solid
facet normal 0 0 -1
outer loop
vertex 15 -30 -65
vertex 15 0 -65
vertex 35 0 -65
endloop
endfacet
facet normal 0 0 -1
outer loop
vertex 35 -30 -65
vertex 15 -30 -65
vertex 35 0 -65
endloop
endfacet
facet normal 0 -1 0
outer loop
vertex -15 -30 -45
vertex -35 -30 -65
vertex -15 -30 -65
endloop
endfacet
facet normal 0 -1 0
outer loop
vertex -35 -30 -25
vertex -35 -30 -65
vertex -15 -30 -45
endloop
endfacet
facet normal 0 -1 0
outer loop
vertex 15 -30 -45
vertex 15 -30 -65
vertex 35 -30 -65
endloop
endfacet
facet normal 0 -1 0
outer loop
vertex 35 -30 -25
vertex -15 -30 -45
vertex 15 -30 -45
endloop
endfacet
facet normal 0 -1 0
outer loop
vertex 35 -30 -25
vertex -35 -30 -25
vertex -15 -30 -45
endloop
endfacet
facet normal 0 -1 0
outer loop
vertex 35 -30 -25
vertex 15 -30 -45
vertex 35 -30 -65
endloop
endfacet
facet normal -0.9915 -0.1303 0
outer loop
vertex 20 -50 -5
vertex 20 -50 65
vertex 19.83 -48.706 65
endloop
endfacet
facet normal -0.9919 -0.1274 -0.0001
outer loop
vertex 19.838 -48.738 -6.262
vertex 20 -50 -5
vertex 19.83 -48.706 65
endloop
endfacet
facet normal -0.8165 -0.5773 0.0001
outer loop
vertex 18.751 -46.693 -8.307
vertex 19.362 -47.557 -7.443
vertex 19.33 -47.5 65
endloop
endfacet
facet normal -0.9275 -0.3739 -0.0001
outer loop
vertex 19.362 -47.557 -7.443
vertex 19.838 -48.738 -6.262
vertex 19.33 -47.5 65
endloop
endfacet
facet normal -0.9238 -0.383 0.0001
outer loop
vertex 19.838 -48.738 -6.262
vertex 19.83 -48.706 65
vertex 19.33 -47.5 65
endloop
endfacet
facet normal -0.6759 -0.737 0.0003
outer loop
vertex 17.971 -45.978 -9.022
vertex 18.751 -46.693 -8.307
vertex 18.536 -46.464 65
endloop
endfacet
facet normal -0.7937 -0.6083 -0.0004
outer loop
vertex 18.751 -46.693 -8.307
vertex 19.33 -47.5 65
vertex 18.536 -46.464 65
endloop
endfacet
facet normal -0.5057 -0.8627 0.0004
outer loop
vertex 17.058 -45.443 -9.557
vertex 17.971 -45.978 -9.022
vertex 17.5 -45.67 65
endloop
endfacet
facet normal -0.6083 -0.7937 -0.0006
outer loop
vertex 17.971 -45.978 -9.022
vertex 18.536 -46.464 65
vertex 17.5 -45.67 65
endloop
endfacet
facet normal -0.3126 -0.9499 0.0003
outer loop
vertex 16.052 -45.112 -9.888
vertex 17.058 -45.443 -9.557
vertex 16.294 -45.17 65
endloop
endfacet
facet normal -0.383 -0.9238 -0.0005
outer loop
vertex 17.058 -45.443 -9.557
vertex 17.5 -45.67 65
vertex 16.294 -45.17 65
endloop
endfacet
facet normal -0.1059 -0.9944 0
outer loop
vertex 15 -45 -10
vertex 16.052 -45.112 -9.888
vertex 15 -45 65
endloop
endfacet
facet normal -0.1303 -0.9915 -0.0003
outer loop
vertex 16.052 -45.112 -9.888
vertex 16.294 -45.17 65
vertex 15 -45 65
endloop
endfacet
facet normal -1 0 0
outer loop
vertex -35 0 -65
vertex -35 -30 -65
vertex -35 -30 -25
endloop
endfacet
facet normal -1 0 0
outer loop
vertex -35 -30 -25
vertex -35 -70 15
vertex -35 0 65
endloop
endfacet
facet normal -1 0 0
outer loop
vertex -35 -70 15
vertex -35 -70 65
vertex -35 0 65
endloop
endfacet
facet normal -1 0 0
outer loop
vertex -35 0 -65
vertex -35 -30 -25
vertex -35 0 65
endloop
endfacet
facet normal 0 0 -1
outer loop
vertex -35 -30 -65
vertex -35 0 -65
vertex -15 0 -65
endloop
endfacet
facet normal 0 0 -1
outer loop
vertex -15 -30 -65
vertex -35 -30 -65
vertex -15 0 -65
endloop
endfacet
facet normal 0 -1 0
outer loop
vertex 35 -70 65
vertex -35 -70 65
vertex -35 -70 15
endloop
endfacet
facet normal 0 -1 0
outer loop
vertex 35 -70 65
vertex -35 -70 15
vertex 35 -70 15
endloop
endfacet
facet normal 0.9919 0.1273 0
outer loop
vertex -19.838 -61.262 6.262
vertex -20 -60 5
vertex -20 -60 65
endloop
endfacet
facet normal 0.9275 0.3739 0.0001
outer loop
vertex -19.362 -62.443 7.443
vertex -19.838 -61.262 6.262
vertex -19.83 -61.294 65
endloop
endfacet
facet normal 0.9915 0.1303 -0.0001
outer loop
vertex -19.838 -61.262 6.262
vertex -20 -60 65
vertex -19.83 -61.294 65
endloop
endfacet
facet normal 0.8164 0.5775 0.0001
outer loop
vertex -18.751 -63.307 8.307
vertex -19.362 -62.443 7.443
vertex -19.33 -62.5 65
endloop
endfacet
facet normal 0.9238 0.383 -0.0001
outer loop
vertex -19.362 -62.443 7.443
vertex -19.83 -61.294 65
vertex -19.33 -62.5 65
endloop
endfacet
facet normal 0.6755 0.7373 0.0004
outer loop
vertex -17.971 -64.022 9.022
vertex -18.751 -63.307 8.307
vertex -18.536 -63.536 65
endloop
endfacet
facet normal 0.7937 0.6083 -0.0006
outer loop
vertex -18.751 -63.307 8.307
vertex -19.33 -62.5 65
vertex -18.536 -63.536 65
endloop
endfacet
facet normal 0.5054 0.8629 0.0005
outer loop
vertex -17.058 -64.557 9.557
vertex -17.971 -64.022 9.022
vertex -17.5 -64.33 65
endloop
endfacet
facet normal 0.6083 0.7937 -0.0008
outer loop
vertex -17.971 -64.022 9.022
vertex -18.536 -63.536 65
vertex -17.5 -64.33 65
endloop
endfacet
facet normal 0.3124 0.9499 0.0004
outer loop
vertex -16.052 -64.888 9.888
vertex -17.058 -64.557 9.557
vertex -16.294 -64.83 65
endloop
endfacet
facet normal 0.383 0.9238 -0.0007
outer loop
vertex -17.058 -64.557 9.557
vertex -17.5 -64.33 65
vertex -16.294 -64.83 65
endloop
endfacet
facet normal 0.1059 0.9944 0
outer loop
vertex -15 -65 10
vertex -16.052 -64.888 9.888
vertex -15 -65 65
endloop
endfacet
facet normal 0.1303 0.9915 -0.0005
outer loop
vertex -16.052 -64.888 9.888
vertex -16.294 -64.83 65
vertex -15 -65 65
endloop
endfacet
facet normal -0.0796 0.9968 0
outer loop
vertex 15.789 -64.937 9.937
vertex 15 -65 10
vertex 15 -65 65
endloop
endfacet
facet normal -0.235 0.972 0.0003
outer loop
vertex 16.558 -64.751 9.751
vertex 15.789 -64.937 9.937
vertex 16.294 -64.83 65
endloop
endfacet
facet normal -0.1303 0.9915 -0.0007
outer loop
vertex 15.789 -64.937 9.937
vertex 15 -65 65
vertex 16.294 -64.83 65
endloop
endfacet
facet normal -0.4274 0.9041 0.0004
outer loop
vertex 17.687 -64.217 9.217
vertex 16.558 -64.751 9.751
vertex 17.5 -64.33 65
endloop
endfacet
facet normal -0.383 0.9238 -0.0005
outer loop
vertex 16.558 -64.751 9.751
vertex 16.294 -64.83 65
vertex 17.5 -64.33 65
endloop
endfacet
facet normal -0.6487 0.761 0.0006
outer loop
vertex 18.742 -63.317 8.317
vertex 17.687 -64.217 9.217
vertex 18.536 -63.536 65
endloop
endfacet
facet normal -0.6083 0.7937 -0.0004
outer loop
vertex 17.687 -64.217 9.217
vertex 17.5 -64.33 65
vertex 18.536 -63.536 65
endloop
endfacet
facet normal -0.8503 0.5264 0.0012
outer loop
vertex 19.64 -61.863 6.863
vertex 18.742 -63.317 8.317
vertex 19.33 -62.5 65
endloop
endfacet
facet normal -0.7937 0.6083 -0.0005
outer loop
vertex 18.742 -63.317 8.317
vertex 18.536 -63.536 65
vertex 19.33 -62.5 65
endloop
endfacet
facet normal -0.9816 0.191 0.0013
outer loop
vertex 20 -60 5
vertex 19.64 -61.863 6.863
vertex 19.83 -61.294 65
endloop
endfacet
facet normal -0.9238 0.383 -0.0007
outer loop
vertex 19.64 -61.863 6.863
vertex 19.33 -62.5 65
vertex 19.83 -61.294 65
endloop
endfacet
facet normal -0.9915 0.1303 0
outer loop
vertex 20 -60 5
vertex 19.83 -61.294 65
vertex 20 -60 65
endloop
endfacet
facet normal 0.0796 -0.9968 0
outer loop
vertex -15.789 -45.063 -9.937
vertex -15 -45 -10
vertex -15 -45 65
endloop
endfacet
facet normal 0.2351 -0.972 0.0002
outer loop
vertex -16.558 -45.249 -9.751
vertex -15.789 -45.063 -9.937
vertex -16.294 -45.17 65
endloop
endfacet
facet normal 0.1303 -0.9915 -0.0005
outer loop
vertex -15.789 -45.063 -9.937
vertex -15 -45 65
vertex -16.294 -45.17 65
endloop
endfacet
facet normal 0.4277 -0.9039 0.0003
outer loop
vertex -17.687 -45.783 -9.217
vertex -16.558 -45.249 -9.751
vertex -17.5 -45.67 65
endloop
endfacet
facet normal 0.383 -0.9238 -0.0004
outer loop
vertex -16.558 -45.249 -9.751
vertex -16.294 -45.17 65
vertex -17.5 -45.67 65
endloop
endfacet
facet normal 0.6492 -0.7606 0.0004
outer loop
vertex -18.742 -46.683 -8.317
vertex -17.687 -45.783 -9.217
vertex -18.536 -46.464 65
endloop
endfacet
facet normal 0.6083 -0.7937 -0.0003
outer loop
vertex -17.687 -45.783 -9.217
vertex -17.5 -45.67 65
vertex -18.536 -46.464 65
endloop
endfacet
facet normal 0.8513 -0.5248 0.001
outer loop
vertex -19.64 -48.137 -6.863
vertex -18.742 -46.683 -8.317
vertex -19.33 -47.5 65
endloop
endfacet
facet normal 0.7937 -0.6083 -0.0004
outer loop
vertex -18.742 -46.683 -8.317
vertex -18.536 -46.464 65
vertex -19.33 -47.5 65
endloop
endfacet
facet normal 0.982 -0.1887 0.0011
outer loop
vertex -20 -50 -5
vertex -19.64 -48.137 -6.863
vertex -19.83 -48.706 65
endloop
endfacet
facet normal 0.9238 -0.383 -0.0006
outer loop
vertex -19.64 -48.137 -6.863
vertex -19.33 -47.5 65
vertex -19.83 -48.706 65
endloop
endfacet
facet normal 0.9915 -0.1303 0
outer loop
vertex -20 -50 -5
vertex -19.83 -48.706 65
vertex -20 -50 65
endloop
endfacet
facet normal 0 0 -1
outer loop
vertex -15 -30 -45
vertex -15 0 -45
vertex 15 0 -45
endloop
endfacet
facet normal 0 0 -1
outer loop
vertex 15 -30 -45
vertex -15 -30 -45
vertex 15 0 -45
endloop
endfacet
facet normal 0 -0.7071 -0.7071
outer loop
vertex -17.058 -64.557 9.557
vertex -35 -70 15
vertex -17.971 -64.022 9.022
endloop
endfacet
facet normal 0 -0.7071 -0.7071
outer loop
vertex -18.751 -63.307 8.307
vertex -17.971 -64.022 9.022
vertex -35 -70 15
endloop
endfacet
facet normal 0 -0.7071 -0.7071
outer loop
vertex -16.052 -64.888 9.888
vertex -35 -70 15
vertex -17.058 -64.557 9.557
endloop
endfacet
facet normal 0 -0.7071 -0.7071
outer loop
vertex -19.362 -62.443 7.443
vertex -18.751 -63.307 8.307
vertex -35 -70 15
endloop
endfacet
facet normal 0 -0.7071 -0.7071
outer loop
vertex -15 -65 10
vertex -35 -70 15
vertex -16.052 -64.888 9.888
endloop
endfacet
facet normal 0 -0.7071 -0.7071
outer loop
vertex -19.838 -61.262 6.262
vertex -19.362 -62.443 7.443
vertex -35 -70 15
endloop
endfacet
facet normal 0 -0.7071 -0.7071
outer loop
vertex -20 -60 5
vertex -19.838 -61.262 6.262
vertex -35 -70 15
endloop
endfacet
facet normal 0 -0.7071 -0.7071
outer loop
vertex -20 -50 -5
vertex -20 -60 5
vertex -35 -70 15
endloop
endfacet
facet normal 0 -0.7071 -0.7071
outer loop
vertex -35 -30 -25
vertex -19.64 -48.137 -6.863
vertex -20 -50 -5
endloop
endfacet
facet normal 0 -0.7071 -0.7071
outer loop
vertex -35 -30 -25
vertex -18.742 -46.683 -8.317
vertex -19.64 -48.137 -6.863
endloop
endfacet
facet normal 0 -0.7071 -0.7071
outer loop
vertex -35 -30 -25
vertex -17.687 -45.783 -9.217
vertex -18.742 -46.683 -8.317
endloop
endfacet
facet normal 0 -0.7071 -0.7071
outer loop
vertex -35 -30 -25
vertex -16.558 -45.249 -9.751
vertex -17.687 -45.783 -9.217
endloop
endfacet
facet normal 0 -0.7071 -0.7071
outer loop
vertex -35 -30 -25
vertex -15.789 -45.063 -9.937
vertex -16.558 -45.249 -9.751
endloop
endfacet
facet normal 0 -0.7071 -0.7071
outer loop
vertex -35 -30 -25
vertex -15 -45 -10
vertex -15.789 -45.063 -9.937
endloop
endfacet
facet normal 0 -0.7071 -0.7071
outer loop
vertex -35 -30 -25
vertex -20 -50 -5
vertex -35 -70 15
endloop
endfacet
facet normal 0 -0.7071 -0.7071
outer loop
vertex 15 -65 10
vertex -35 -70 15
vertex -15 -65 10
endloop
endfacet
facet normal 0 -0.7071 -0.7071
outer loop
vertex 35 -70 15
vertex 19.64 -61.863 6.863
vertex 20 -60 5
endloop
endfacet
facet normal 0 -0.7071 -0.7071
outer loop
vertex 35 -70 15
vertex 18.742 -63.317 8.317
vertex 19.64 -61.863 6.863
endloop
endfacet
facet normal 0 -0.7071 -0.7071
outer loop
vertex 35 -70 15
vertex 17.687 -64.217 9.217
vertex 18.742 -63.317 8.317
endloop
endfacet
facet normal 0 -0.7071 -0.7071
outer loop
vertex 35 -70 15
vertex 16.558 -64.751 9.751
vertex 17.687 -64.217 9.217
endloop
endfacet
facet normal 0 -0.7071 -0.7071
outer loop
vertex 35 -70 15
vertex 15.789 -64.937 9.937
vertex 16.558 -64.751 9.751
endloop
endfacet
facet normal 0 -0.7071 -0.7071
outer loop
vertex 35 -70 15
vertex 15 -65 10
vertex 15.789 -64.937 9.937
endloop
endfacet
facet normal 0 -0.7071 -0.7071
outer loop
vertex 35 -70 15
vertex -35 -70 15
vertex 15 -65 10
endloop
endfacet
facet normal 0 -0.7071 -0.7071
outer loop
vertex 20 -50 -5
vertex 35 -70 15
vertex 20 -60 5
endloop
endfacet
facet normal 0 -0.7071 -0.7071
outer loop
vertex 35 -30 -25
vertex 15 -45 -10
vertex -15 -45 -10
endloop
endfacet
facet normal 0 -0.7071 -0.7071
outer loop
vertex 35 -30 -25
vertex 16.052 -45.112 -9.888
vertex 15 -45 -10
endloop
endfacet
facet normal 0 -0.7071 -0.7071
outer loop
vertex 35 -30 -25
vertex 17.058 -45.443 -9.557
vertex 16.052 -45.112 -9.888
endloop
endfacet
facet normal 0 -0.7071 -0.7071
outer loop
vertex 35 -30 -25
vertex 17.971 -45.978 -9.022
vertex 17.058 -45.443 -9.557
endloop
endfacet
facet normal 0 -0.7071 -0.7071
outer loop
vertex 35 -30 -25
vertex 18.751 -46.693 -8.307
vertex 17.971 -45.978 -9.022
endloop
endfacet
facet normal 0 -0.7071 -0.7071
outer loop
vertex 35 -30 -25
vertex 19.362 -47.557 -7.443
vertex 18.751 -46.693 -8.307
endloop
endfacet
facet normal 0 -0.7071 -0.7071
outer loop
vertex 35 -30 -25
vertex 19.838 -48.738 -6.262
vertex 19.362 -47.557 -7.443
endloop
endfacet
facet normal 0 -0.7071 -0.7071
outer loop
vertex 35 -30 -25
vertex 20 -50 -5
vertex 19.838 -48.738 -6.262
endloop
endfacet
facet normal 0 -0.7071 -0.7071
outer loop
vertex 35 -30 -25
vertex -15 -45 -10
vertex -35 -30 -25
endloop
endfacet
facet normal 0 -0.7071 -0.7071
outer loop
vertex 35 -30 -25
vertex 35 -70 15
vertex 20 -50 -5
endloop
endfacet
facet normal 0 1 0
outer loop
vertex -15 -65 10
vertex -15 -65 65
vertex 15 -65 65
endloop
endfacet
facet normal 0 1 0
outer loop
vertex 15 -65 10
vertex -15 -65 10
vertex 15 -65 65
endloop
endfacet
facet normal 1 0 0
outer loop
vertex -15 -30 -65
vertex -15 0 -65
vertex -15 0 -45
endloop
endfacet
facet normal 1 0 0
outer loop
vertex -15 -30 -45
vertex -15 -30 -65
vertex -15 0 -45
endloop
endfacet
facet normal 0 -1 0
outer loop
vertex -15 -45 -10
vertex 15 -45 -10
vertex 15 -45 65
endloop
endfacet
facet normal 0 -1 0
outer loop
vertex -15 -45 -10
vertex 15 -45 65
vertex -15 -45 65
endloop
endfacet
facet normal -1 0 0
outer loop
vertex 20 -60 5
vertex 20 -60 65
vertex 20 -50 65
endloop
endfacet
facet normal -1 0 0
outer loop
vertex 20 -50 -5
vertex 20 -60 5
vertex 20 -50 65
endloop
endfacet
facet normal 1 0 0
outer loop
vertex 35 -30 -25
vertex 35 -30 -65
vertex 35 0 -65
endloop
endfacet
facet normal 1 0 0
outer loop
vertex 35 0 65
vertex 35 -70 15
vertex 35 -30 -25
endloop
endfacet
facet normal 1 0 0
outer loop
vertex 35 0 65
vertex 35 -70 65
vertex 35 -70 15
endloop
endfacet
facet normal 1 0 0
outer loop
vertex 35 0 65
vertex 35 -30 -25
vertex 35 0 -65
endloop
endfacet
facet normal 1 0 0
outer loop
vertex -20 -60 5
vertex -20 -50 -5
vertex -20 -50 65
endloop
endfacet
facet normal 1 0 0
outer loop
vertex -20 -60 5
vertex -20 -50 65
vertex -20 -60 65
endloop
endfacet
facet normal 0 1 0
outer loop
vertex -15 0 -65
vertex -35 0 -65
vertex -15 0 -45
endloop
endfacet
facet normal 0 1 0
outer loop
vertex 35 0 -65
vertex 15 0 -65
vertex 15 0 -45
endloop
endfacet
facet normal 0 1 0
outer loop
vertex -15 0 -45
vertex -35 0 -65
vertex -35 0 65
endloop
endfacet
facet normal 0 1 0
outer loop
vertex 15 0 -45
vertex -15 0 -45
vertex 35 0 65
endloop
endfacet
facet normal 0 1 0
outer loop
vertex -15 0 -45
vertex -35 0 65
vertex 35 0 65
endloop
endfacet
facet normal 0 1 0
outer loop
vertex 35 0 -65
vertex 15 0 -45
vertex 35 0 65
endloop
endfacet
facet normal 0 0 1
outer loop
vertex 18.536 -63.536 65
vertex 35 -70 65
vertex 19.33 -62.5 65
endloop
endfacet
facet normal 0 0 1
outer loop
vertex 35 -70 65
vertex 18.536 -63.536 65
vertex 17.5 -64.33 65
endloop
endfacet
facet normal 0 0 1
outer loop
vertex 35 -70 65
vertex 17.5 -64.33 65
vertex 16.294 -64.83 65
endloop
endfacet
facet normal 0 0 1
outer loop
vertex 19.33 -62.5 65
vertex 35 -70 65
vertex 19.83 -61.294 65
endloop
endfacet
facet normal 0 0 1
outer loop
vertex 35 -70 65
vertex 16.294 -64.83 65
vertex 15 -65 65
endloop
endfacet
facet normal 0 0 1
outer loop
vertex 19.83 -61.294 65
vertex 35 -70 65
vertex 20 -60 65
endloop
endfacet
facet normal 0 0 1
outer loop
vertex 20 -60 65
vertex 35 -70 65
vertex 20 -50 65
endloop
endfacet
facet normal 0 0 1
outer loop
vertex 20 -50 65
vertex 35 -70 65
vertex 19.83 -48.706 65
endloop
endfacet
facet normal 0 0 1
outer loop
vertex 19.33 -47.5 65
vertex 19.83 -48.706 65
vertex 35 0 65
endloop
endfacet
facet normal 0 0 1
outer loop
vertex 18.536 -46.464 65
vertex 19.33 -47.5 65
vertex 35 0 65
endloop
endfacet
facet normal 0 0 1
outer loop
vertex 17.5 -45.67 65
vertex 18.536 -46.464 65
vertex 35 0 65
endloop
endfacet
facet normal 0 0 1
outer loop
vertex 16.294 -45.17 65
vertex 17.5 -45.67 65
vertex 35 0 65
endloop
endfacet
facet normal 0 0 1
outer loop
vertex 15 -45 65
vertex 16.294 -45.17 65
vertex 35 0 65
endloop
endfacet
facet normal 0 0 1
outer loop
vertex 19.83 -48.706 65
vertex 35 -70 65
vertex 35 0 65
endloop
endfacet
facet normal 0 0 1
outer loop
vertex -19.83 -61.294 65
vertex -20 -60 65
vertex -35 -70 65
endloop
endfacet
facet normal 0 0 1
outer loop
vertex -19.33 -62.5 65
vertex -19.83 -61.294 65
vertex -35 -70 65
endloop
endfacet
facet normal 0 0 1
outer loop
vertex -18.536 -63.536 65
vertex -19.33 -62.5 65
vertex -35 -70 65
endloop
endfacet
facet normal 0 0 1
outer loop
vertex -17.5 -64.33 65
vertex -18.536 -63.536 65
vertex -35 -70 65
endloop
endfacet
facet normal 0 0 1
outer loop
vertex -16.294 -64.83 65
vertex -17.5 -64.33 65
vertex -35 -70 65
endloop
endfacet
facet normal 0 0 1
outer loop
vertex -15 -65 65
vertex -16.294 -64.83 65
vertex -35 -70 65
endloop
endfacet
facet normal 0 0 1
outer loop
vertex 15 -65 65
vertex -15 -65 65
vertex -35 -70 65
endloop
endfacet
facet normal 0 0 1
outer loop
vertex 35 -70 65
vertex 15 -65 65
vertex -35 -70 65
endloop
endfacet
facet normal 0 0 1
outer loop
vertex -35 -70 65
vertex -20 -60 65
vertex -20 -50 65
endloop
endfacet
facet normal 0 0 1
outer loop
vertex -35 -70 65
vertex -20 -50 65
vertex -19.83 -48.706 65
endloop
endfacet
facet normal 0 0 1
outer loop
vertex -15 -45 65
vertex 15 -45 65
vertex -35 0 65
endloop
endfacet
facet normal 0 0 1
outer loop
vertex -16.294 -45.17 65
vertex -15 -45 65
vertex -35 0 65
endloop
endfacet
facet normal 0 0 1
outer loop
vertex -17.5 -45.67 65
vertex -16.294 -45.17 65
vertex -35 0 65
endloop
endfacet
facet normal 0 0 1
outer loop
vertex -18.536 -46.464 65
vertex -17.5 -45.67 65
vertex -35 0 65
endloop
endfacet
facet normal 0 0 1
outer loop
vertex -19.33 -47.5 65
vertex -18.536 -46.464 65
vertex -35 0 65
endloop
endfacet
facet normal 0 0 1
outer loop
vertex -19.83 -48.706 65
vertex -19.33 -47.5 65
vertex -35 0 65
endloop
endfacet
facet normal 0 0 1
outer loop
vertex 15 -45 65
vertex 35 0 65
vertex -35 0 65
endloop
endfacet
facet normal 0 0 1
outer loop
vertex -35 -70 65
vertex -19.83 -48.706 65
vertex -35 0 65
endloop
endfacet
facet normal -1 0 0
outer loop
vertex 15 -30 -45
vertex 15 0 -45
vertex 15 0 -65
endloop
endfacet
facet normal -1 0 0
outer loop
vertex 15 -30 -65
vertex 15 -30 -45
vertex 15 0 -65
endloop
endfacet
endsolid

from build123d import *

# Parameters (mm, degrees)
F1_DEPTH = 30
F3_DEPTH = 40
F5_DEPTH = 70
F7_DEPTH = 130.001


with BuildPart() as f1:
    # F0 (on Front) → F1 (new body)
    with BuildSketch(Plane.XZ):
        Polygon((35, -45), (35, 65), (-35, 65), (-35, -45), (-35, -65), (-15, -65), (-15, -45), (15, -45), (15, -65), (35, -65), align=None)
    extrude(amount=F1_DEPTH)

    # F2 (on face) → F3 (join)
    with BuildSketch(Plane.XZ.offset(30)):
        Polygon((-20, 65), (-35, 65), (-35, 50), (-35, 30), (-35, 15), (-20, 15), (20, 15), (35, 15), (35, 30), (35, 50), (35, 65), (20, 65), align=None)
    extrude(amount=F3_DEPTH)

    # F4 (on face) → F5 (join)
    with BuildSketch(Plane.YZ.offset(35)):
        Polygon((-70, 15), (-30, -25), (-30, 15), align=None)
    extrude(amount=-F5_DEPTH)

    # F6 (on face) → F7 (cut, through all)
    with BuildSketch(Plane.XY.offset(65)):
        with BuildLine():
            Line((15, -45), (-15, -45))
            ThreePointArc((-15, -45), (-18.535534, -46.464466), (-20, -50))
            Line((-20, -50), (-20, -60))
            ThreePointArc((-20, -60), (-18.535534, -63.535534), (-15, -65))
            Line((-15, -65), (15, -65))
            ThreePointArc((15, -65), (18.535534, -63.535534), (20, -60))
            Line((20, -60), (20, -50))
            ThreePointArc((20, -50), (18.535534, -46.464466), (15, -45))
        make_face()
    extrude(amount=-F7_DEPTH, mode=Mode.SUBTRACT)


solid = f1.part
